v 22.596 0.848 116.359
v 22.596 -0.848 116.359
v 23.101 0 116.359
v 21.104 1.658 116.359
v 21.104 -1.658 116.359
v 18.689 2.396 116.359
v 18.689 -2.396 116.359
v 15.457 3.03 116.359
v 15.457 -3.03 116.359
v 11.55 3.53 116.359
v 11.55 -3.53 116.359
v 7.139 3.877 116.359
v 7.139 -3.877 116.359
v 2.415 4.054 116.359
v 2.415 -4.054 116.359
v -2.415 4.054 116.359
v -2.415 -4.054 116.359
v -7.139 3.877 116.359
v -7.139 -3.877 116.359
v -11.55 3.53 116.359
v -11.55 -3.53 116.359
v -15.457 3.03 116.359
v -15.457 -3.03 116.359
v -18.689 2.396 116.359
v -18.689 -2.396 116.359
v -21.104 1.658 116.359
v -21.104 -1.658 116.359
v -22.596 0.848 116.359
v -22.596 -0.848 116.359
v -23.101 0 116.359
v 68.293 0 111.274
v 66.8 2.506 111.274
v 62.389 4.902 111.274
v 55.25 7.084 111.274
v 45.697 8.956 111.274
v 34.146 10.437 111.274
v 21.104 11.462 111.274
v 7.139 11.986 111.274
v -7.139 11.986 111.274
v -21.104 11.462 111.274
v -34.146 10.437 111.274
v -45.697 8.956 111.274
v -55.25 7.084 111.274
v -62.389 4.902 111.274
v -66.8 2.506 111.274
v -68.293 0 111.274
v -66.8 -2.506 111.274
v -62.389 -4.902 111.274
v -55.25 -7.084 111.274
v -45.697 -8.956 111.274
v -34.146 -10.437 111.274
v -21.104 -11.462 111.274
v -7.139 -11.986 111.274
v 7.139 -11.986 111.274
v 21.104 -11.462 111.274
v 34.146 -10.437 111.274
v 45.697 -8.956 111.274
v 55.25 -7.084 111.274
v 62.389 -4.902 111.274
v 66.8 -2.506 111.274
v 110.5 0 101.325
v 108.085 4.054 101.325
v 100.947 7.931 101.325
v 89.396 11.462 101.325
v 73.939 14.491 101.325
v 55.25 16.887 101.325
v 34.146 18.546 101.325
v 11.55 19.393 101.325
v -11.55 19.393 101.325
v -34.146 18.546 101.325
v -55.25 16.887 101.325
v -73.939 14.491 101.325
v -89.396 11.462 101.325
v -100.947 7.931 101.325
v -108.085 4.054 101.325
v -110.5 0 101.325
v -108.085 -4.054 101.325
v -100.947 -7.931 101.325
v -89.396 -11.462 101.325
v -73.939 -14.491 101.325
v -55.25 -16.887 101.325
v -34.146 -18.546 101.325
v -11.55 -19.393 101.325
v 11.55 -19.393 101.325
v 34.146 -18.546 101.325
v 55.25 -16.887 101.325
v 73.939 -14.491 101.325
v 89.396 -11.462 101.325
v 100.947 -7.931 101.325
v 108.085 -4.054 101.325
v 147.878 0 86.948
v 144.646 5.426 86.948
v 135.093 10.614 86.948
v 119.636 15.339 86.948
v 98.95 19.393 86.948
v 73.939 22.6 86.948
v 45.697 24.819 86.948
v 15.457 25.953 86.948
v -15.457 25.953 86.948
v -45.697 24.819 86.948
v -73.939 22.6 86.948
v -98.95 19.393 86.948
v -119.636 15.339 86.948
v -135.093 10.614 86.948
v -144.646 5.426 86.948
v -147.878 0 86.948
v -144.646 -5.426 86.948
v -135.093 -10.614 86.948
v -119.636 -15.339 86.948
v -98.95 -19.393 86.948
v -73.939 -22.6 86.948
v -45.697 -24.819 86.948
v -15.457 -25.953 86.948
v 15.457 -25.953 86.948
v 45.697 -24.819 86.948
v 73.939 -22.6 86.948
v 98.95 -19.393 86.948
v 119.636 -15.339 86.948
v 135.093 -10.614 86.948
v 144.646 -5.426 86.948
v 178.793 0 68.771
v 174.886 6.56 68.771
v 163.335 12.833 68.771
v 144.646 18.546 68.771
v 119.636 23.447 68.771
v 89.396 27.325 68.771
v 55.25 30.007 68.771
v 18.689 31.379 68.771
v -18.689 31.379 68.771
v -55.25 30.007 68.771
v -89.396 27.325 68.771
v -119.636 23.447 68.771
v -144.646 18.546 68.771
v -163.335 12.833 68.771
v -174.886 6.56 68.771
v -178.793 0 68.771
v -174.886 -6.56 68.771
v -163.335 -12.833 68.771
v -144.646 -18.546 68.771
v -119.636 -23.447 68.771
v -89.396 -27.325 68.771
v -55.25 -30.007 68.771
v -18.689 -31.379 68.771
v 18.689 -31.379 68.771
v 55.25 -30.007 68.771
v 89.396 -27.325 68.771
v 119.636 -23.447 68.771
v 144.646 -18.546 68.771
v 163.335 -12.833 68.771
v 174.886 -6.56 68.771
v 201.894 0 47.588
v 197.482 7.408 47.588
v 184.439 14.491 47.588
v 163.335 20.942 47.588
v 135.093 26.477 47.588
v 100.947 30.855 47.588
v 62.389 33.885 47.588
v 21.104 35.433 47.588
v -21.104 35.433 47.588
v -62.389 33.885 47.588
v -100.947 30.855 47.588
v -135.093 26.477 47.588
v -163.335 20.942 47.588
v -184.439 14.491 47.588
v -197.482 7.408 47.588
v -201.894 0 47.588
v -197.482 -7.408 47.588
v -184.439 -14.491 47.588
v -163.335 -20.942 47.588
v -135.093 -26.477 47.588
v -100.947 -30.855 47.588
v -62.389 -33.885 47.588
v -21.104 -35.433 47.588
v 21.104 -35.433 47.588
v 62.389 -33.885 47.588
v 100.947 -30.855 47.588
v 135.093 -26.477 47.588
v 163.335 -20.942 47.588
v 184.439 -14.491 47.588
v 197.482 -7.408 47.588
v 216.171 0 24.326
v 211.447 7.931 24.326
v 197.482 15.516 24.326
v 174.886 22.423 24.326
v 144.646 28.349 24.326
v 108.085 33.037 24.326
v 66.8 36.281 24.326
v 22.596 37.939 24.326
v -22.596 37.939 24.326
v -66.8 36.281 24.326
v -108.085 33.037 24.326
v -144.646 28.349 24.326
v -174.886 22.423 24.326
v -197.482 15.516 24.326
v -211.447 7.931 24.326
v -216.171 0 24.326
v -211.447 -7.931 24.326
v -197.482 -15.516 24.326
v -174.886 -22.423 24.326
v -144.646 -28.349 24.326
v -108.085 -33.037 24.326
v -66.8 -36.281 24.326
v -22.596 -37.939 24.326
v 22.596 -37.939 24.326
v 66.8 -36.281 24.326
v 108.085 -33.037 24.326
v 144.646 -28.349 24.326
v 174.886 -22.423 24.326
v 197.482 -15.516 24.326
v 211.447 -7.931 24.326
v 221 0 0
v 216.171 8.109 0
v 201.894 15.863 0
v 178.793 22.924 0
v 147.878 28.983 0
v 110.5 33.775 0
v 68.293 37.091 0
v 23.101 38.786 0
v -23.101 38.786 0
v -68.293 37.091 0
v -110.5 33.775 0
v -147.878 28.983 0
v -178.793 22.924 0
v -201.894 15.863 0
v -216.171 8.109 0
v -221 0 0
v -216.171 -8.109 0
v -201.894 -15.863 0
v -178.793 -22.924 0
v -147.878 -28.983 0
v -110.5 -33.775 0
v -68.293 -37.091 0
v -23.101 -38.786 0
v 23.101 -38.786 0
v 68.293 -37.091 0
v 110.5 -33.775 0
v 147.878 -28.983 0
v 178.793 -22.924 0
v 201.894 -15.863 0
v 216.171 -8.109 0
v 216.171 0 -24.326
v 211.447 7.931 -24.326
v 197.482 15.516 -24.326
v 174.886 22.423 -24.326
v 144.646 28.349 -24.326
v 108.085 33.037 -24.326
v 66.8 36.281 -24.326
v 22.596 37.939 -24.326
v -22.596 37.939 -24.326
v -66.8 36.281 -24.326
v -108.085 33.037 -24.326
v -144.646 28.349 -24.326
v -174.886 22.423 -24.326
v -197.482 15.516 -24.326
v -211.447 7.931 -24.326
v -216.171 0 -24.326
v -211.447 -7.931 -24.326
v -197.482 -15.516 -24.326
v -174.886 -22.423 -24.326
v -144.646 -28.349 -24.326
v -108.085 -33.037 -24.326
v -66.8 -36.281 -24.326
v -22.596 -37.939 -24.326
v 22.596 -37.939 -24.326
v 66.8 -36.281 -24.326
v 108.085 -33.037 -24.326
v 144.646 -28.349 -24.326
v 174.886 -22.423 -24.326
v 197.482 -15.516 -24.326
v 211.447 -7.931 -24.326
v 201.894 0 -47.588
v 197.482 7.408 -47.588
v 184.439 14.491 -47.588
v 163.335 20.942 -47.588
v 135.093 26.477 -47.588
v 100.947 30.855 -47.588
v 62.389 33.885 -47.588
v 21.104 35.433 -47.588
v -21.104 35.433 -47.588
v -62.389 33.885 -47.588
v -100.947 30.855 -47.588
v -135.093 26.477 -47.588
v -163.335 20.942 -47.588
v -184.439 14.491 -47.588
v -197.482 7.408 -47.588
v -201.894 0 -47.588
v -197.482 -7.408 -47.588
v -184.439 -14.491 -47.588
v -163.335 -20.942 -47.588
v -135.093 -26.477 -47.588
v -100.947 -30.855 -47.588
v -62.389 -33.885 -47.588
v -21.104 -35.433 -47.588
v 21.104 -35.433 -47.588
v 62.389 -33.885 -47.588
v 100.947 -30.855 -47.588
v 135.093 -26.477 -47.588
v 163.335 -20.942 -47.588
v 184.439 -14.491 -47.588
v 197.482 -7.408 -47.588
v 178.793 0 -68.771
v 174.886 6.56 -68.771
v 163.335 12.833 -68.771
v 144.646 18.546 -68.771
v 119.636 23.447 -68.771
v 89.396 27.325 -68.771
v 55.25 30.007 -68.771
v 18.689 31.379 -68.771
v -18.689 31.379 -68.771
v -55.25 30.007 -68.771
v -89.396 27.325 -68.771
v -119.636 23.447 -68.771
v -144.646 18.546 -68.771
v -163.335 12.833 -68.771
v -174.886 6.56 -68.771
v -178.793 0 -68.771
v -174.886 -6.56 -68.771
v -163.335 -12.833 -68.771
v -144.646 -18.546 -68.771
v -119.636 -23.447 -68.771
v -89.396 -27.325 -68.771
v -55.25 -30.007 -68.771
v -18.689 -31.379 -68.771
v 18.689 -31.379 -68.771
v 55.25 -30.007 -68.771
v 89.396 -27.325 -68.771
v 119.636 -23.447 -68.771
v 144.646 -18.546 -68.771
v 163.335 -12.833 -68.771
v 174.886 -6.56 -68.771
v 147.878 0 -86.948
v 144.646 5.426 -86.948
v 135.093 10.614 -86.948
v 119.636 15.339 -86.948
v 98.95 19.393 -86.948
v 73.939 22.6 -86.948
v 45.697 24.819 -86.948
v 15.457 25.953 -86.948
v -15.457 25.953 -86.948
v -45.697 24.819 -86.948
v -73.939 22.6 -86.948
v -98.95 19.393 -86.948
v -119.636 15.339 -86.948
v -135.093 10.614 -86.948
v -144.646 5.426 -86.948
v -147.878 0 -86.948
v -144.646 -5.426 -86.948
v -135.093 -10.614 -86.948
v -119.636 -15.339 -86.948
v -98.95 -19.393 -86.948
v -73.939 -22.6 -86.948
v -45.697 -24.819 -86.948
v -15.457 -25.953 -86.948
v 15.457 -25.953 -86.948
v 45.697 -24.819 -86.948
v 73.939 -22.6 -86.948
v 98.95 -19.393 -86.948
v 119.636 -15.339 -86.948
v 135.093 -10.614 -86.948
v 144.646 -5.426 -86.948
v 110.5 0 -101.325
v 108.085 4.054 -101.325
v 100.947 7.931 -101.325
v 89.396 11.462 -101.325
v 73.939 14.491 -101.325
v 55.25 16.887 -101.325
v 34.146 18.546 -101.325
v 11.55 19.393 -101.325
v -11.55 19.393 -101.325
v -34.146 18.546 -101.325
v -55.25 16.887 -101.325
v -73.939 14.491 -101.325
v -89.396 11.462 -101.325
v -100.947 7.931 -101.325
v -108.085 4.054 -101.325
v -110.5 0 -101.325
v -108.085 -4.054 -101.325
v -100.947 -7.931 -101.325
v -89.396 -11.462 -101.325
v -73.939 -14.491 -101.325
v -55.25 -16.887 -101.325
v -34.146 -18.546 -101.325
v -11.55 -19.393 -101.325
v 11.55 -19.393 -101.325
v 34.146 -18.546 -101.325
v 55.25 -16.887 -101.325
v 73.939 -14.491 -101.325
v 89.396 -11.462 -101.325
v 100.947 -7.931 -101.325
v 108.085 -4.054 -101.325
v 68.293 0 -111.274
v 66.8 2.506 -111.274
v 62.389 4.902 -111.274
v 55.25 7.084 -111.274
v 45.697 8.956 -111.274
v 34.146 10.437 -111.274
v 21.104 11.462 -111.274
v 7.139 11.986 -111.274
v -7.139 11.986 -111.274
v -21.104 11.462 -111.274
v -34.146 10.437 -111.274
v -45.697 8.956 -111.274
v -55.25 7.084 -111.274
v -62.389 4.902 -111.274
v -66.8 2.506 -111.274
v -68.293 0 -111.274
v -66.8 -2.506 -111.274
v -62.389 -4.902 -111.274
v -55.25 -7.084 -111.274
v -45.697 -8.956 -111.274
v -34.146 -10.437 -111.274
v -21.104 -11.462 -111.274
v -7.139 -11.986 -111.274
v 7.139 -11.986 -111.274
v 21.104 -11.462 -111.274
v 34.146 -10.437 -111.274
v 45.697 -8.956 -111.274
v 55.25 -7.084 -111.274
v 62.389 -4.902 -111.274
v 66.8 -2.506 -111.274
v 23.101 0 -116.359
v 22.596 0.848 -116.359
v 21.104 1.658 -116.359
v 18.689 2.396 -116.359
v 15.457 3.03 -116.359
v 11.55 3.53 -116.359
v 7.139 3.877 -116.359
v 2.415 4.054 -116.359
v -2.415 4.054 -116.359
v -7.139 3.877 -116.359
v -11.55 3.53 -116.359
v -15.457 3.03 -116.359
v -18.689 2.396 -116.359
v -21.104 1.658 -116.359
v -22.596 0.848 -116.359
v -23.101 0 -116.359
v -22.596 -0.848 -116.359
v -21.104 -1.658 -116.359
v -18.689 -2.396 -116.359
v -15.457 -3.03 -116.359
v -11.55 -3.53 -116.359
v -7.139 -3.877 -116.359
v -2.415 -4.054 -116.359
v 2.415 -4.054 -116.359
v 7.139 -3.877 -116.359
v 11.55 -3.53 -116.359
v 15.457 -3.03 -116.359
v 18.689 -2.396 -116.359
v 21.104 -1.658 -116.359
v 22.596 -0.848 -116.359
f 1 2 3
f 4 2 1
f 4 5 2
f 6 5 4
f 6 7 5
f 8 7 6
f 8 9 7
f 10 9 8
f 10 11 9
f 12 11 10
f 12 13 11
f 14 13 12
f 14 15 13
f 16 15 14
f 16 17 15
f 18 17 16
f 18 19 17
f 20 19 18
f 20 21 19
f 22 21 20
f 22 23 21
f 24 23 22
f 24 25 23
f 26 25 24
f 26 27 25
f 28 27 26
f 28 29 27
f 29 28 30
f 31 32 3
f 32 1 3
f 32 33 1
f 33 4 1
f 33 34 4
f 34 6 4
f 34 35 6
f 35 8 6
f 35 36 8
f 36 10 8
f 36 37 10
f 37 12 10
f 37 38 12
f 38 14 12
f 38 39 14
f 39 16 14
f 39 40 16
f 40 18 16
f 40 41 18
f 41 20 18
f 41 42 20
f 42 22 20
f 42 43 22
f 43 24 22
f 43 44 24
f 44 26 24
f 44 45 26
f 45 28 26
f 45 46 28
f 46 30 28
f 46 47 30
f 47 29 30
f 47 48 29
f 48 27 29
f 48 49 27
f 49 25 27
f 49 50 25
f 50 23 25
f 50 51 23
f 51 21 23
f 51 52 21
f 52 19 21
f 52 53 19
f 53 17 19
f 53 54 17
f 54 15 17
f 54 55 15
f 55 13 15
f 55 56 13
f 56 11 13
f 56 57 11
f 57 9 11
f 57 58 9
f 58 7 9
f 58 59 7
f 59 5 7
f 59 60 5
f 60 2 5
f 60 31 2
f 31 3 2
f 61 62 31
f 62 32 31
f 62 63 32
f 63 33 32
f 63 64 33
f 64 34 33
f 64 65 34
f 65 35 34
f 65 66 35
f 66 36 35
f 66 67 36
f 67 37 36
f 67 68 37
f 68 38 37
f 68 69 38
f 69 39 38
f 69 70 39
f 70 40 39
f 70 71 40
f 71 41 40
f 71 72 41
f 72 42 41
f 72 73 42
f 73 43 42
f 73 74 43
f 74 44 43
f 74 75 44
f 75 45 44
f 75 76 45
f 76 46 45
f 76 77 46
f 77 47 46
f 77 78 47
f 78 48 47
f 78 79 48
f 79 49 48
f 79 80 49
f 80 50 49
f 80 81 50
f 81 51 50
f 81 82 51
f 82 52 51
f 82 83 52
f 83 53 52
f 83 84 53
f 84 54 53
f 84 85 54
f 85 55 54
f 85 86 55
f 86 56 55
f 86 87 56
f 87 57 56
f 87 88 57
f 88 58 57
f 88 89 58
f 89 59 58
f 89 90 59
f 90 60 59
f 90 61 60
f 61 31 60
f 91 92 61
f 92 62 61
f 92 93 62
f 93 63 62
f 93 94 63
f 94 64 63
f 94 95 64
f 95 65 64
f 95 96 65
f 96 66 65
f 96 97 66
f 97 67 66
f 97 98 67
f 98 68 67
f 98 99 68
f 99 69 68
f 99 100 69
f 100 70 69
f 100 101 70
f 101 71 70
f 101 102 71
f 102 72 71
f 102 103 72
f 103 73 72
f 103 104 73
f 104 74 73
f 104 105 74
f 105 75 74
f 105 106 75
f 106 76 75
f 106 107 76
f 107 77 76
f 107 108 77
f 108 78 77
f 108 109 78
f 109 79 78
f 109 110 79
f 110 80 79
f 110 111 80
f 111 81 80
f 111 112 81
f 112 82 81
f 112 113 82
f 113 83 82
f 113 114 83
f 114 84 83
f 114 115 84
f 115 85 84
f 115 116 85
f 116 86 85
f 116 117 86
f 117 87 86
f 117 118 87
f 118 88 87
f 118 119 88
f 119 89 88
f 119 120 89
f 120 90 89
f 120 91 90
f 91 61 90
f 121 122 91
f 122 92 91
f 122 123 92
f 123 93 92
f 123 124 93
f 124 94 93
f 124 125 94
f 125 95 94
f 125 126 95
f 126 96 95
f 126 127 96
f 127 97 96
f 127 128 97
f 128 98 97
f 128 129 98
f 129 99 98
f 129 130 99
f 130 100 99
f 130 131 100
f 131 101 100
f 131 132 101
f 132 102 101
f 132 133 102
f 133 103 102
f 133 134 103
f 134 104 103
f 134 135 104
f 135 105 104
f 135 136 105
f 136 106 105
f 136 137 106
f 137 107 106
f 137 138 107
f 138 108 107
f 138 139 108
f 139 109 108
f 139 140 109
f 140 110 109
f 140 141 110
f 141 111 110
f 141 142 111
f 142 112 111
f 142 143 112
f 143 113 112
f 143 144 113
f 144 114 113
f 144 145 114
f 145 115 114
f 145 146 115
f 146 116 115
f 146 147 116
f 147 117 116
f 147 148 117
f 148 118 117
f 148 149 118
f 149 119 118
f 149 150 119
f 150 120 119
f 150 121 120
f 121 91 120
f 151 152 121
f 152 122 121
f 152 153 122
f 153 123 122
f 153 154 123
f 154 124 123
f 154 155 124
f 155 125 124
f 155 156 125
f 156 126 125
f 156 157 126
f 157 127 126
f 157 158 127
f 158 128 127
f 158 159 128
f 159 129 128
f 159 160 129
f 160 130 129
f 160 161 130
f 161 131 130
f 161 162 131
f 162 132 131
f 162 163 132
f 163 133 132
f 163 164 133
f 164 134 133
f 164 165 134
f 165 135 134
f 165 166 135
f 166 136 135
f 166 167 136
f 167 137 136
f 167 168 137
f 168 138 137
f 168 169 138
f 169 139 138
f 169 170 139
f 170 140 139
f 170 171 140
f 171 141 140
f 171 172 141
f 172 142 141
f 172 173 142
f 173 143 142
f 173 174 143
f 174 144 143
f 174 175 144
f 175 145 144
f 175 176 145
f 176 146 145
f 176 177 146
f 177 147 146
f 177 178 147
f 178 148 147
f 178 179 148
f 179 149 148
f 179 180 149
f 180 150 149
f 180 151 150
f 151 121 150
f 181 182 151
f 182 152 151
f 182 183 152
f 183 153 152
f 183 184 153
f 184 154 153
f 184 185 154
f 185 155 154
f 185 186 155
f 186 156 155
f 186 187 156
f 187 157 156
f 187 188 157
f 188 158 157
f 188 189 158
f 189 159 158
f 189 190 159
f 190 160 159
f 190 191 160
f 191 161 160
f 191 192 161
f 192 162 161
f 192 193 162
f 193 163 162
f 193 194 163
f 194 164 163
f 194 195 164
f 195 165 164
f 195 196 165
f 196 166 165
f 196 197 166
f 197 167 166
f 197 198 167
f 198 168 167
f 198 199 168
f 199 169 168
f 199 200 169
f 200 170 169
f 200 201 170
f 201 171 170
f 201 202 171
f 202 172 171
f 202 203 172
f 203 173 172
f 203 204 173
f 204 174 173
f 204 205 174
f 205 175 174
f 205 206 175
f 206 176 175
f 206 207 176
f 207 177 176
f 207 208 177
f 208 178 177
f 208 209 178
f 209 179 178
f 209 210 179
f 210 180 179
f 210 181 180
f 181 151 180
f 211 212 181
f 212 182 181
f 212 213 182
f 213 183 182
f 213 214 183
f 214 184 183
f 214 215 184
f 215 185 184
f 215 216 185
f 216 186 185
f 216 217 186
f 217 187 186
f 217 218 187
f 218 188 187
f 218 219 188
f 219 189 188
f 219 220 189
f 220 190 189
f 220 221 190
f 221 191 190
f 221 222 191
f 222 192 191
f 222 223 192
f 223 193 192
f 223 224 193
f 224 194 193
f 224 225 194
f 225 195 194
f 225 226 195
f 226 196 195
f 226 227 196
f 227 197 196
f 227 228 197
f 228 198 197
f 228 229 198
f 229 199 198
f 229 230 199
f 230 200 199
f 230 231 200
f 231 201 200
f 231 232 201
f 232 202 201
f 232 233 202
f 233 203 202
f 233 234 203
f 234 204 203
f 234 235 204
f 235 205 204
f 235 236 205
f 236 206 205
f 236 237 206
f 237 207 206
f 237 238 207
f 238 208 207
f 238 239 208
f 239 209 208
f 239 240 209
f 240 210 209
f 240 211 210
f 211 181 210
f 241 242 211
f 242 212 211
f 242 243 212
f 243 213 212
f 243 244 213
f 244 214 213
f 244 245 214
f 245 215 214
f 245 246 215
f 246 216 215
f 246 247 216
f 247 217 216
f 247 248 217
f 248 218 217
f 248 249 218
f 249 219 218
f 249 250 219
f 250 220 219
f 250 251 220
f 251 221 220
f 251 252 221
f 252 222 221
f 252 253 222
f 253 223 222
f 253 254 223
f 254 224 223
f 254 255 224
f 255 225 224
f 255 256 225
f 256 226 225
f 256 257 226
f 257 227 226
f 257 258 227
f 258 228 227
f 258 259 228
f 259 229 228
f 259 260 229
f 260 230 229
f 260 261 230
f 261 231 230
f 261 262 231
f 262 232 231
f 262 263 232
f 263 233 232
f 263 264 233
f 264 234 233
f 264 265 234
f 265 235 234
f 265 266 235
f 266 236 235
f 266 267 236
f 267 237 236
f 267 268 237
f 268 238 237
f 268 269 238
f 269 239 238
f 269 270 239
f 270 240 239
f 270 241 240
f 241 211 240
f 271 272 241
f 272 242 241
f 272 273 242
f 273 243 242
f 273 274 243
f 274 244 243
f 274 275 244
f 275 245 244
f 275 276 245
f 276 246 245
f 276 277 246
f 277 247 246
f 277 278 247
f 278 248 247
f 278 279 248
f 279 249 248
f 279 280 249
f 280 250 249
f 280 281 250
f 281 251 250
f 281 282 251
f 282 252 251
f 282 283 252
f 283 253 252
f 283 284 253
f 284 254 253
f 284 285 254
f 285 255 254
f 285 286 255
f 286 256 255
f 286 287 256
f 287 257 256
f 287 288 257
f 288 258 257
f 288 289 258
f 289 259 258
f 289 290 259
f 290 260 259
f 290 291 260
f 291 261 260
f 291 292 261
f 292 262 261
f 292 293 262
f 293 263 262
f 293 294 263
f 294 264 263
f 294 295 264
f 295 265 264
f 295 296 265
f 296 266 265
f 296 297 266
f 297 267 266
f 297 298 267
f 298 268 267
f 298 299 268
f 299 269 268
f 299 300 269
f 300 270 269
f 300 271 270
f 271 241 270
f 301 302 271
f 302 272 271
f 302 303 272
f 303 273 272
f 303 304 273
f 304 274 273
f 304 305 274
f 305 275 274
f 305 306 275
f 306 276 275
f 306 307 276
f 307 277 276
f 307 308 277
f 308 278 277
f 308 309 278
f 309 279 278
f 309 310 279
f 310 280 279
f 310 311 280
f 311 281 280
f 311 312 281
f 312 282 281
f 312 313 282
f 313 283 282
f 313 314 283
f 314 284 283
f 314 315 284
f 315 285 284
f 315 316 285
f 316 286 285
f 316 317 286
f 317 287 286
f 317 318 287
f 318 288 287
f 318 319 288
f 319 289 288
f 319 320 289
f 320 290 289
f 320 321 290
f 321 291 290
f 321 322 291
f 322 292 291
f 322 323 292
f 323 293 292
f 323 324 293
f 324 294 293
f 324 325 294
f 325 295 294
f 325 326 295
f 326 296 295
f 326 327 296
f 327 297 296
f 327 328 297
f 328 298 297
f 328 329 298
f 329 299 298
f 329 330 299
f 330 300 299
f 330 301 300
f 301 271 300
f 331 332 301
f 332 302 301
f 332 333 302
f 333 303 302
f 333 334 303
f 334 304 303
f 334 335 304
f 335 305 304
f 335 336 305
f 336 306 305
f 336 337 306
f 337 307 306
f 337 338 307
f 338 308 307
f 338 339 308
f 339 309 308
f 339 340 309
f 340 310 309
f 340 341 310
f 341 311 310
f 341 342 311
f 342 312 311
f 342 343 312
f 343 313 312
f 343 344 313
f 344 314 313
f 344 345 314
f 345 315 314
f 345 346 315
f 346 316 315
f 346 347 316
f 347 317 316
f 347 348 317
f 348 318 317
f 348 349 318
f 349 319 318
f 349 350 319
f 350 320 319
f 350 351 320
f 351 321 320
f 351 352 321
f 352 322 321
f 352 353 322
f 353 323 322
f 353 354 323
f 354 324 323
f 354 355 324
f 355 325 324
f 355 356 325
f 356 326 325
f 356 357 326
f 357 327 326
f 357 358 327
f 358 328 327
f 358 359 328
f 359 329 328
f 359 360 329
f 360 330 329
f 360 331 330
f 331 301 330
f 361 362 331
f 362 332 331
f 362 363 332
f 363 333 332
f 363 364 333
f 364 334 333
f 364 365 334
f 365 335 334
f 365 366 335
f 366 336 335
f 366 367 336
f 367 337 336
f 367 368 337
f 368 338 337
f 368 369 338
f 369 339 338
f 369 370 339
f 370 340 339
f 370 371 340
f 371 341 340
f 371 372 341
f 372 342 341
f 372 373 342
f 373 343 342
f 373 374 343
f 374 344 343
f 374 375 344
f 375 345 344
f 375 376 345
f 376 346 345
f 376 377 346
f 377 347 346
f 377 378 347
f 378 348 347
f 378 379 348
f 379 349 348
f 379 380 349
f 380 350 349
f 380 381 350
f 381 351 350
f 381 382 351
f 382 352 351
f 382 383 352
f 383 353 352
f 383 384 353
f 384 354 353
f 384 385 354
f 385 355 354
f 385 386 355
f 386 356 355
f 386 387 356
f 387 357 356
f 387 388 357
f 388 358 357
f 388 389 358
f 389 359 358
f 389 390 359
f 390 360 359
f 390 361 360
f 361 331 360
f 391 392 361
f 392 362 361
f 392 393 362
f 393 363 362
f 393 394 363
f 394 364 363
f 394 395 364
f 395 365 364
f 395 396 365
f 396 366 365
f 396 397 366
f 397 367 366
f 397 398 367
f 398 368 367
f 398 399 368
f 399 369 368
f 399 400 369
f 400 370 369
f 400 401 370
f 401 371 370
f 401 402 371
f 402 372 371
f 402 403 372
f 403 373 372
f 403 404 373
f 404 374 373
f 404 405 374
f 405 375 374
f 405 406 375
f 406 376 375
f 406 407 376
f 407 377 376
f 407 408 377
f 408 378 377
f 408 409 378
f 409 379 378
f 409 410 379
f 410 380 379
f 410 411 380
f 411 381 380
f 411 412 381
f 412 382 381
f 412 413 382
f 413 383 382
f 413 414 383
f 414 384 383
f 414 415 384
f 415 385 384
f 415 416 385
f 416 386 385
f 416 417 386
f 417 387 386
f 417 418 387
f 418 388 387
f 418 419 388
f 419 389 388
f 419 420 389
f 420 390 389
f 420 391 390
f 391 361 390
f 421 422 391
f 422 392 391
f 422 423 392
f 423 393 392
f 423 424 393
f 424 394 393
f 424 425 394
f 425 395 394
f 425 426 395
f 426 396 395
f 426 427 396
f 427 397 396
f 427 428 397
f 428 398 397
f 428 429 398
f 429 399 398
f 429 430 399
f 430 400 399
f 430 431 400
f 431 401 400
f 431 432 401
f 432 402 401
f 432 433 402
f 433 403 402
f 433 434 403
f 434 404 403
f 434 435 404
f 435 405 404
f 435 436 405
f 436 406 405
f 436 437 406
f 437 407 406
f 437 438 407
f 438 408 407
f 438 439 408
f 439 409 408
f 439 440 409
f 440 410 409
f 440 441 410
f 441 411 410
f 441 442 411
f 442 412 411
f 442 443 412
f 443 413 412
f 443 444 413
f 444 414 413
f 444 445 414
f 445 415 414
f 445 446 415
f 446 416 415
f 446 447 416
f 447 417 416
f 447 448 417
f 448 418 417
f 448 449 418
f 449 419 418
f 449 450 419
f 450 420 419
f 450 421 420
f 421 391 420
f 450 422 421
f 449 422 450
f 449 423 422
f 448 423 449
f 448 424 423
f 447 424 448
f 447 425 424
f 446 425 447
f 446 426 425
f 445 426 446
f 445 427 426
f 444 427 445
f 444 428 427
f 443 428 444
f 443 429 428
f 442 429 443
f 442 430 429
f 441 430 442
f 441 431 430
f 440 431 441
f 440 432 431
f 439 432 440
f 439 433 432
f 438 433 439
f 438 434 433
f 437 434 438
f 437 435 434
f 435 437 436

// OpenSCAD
// Generated by SolidPython 1.0.1 on 2020-07-29 00:46:52


scale(v = [17, 3, 9]) {
	sphere(r = 13);
}
/***********************************************
*********      SolidPython code:      **********
************************************************
 
# import packages: SolidPython
from solid import *
from solid.utils import *
from itertools import chain, combinations, permutations


class Resize:

    def __init__(self, scad_file):
        self.scad_file = scad_file
        #self.scad_file = import_scad(scad_file)
        # cone/cylinder param:
        self.r1 = 0
        self.r2 = 0
        self.h = 0
        # rectangular prism param:
        self.w = 0
        self.l = 0
        # ellipse param:
        self.r = 0

    # import OpenScad code (file name corresponds to shape)


    # classify shape + parameters
    def assign(self, param1, param2, param3):
        if self.scad_file == 'cone.scad':
            self.r1 = param1
            self.r2 = param2
            self.h = param3
        elif self.scad_file == 'cylinder.scad':
            self.r1 = param1
            self.r2 = param2
            self.h = param3
        elif self.scad_file == 'rectangularPrism.scad':
            self.h = param1
            self.l = param2
            self.w = param3
        else:
            self.r = param1
            self.h = param2

    # resize parameters
    def iterate(self):
        x = range(3, 20, 2)
        i = 1
        if self.scad_file == 'cone.scad':
            tempList = list(permutations(x, 2))
            for temp in tempList:
                param1 = temp[0]
                param2 = temp[1]
                filepath = 'produced_scad_files/' + 'cone' + str(param1) + '_' + str(param2) + '_' + '.scad'
                scad_render_to_file(cylinder(h=param1, r1=param2, r2=0), filepath)

        elif self.scad_file == 'cylinder.scad':
            tempList = list(permutations(x, 3))
            for temp in tempList:
                param1 = temp[0]
                param2 = temp[1]
                filepath = 'produced_scad_files/' + 'cylinder' + str(param1) + '_' + str(param2) + '_' + '.scad'
                scad_render_to_file(cylinder(h=param1, r1=param2, r2=param2), filepath)

        elif self.scad_file == 'rectangularPrism.scad':
            tempList = list(permutations(x, 3))
            for temp in tempList:
                param1 = temp[0]
                param2 = temp[1]
                param3 = temp[2]
                filepath = 'produced_scad_files/' + 'rectangularPrism' + str(param1) + '_' + str(param2) + '_' + str(
                    param3) + '.scad'
                scad_render_to_file(cube(size=(param1, param2, param3)), filepath)

        elif self.scad_file == 'ellipse.scad':
            tempList = list(permutations(x, 4))
            for temp in tempList:
                param1 = temp[0]
                param2 = temp[1]
                param3 = temp[2]
                param4 = temp[3]
                filepath = 'produced_scad_files/' + 'ellipse' + str(param1) + '_' + str(param2) + '_' + str(param3) + '_' + str(param4) + '.scad'
                scad_render_to_file(scale([param1, param2, param3])(sphere(r=param4)), filepath)

    def render_to_scadfile(self):
        scad_render_to_file(scad, 'example.scad') 
 
************************************************/
